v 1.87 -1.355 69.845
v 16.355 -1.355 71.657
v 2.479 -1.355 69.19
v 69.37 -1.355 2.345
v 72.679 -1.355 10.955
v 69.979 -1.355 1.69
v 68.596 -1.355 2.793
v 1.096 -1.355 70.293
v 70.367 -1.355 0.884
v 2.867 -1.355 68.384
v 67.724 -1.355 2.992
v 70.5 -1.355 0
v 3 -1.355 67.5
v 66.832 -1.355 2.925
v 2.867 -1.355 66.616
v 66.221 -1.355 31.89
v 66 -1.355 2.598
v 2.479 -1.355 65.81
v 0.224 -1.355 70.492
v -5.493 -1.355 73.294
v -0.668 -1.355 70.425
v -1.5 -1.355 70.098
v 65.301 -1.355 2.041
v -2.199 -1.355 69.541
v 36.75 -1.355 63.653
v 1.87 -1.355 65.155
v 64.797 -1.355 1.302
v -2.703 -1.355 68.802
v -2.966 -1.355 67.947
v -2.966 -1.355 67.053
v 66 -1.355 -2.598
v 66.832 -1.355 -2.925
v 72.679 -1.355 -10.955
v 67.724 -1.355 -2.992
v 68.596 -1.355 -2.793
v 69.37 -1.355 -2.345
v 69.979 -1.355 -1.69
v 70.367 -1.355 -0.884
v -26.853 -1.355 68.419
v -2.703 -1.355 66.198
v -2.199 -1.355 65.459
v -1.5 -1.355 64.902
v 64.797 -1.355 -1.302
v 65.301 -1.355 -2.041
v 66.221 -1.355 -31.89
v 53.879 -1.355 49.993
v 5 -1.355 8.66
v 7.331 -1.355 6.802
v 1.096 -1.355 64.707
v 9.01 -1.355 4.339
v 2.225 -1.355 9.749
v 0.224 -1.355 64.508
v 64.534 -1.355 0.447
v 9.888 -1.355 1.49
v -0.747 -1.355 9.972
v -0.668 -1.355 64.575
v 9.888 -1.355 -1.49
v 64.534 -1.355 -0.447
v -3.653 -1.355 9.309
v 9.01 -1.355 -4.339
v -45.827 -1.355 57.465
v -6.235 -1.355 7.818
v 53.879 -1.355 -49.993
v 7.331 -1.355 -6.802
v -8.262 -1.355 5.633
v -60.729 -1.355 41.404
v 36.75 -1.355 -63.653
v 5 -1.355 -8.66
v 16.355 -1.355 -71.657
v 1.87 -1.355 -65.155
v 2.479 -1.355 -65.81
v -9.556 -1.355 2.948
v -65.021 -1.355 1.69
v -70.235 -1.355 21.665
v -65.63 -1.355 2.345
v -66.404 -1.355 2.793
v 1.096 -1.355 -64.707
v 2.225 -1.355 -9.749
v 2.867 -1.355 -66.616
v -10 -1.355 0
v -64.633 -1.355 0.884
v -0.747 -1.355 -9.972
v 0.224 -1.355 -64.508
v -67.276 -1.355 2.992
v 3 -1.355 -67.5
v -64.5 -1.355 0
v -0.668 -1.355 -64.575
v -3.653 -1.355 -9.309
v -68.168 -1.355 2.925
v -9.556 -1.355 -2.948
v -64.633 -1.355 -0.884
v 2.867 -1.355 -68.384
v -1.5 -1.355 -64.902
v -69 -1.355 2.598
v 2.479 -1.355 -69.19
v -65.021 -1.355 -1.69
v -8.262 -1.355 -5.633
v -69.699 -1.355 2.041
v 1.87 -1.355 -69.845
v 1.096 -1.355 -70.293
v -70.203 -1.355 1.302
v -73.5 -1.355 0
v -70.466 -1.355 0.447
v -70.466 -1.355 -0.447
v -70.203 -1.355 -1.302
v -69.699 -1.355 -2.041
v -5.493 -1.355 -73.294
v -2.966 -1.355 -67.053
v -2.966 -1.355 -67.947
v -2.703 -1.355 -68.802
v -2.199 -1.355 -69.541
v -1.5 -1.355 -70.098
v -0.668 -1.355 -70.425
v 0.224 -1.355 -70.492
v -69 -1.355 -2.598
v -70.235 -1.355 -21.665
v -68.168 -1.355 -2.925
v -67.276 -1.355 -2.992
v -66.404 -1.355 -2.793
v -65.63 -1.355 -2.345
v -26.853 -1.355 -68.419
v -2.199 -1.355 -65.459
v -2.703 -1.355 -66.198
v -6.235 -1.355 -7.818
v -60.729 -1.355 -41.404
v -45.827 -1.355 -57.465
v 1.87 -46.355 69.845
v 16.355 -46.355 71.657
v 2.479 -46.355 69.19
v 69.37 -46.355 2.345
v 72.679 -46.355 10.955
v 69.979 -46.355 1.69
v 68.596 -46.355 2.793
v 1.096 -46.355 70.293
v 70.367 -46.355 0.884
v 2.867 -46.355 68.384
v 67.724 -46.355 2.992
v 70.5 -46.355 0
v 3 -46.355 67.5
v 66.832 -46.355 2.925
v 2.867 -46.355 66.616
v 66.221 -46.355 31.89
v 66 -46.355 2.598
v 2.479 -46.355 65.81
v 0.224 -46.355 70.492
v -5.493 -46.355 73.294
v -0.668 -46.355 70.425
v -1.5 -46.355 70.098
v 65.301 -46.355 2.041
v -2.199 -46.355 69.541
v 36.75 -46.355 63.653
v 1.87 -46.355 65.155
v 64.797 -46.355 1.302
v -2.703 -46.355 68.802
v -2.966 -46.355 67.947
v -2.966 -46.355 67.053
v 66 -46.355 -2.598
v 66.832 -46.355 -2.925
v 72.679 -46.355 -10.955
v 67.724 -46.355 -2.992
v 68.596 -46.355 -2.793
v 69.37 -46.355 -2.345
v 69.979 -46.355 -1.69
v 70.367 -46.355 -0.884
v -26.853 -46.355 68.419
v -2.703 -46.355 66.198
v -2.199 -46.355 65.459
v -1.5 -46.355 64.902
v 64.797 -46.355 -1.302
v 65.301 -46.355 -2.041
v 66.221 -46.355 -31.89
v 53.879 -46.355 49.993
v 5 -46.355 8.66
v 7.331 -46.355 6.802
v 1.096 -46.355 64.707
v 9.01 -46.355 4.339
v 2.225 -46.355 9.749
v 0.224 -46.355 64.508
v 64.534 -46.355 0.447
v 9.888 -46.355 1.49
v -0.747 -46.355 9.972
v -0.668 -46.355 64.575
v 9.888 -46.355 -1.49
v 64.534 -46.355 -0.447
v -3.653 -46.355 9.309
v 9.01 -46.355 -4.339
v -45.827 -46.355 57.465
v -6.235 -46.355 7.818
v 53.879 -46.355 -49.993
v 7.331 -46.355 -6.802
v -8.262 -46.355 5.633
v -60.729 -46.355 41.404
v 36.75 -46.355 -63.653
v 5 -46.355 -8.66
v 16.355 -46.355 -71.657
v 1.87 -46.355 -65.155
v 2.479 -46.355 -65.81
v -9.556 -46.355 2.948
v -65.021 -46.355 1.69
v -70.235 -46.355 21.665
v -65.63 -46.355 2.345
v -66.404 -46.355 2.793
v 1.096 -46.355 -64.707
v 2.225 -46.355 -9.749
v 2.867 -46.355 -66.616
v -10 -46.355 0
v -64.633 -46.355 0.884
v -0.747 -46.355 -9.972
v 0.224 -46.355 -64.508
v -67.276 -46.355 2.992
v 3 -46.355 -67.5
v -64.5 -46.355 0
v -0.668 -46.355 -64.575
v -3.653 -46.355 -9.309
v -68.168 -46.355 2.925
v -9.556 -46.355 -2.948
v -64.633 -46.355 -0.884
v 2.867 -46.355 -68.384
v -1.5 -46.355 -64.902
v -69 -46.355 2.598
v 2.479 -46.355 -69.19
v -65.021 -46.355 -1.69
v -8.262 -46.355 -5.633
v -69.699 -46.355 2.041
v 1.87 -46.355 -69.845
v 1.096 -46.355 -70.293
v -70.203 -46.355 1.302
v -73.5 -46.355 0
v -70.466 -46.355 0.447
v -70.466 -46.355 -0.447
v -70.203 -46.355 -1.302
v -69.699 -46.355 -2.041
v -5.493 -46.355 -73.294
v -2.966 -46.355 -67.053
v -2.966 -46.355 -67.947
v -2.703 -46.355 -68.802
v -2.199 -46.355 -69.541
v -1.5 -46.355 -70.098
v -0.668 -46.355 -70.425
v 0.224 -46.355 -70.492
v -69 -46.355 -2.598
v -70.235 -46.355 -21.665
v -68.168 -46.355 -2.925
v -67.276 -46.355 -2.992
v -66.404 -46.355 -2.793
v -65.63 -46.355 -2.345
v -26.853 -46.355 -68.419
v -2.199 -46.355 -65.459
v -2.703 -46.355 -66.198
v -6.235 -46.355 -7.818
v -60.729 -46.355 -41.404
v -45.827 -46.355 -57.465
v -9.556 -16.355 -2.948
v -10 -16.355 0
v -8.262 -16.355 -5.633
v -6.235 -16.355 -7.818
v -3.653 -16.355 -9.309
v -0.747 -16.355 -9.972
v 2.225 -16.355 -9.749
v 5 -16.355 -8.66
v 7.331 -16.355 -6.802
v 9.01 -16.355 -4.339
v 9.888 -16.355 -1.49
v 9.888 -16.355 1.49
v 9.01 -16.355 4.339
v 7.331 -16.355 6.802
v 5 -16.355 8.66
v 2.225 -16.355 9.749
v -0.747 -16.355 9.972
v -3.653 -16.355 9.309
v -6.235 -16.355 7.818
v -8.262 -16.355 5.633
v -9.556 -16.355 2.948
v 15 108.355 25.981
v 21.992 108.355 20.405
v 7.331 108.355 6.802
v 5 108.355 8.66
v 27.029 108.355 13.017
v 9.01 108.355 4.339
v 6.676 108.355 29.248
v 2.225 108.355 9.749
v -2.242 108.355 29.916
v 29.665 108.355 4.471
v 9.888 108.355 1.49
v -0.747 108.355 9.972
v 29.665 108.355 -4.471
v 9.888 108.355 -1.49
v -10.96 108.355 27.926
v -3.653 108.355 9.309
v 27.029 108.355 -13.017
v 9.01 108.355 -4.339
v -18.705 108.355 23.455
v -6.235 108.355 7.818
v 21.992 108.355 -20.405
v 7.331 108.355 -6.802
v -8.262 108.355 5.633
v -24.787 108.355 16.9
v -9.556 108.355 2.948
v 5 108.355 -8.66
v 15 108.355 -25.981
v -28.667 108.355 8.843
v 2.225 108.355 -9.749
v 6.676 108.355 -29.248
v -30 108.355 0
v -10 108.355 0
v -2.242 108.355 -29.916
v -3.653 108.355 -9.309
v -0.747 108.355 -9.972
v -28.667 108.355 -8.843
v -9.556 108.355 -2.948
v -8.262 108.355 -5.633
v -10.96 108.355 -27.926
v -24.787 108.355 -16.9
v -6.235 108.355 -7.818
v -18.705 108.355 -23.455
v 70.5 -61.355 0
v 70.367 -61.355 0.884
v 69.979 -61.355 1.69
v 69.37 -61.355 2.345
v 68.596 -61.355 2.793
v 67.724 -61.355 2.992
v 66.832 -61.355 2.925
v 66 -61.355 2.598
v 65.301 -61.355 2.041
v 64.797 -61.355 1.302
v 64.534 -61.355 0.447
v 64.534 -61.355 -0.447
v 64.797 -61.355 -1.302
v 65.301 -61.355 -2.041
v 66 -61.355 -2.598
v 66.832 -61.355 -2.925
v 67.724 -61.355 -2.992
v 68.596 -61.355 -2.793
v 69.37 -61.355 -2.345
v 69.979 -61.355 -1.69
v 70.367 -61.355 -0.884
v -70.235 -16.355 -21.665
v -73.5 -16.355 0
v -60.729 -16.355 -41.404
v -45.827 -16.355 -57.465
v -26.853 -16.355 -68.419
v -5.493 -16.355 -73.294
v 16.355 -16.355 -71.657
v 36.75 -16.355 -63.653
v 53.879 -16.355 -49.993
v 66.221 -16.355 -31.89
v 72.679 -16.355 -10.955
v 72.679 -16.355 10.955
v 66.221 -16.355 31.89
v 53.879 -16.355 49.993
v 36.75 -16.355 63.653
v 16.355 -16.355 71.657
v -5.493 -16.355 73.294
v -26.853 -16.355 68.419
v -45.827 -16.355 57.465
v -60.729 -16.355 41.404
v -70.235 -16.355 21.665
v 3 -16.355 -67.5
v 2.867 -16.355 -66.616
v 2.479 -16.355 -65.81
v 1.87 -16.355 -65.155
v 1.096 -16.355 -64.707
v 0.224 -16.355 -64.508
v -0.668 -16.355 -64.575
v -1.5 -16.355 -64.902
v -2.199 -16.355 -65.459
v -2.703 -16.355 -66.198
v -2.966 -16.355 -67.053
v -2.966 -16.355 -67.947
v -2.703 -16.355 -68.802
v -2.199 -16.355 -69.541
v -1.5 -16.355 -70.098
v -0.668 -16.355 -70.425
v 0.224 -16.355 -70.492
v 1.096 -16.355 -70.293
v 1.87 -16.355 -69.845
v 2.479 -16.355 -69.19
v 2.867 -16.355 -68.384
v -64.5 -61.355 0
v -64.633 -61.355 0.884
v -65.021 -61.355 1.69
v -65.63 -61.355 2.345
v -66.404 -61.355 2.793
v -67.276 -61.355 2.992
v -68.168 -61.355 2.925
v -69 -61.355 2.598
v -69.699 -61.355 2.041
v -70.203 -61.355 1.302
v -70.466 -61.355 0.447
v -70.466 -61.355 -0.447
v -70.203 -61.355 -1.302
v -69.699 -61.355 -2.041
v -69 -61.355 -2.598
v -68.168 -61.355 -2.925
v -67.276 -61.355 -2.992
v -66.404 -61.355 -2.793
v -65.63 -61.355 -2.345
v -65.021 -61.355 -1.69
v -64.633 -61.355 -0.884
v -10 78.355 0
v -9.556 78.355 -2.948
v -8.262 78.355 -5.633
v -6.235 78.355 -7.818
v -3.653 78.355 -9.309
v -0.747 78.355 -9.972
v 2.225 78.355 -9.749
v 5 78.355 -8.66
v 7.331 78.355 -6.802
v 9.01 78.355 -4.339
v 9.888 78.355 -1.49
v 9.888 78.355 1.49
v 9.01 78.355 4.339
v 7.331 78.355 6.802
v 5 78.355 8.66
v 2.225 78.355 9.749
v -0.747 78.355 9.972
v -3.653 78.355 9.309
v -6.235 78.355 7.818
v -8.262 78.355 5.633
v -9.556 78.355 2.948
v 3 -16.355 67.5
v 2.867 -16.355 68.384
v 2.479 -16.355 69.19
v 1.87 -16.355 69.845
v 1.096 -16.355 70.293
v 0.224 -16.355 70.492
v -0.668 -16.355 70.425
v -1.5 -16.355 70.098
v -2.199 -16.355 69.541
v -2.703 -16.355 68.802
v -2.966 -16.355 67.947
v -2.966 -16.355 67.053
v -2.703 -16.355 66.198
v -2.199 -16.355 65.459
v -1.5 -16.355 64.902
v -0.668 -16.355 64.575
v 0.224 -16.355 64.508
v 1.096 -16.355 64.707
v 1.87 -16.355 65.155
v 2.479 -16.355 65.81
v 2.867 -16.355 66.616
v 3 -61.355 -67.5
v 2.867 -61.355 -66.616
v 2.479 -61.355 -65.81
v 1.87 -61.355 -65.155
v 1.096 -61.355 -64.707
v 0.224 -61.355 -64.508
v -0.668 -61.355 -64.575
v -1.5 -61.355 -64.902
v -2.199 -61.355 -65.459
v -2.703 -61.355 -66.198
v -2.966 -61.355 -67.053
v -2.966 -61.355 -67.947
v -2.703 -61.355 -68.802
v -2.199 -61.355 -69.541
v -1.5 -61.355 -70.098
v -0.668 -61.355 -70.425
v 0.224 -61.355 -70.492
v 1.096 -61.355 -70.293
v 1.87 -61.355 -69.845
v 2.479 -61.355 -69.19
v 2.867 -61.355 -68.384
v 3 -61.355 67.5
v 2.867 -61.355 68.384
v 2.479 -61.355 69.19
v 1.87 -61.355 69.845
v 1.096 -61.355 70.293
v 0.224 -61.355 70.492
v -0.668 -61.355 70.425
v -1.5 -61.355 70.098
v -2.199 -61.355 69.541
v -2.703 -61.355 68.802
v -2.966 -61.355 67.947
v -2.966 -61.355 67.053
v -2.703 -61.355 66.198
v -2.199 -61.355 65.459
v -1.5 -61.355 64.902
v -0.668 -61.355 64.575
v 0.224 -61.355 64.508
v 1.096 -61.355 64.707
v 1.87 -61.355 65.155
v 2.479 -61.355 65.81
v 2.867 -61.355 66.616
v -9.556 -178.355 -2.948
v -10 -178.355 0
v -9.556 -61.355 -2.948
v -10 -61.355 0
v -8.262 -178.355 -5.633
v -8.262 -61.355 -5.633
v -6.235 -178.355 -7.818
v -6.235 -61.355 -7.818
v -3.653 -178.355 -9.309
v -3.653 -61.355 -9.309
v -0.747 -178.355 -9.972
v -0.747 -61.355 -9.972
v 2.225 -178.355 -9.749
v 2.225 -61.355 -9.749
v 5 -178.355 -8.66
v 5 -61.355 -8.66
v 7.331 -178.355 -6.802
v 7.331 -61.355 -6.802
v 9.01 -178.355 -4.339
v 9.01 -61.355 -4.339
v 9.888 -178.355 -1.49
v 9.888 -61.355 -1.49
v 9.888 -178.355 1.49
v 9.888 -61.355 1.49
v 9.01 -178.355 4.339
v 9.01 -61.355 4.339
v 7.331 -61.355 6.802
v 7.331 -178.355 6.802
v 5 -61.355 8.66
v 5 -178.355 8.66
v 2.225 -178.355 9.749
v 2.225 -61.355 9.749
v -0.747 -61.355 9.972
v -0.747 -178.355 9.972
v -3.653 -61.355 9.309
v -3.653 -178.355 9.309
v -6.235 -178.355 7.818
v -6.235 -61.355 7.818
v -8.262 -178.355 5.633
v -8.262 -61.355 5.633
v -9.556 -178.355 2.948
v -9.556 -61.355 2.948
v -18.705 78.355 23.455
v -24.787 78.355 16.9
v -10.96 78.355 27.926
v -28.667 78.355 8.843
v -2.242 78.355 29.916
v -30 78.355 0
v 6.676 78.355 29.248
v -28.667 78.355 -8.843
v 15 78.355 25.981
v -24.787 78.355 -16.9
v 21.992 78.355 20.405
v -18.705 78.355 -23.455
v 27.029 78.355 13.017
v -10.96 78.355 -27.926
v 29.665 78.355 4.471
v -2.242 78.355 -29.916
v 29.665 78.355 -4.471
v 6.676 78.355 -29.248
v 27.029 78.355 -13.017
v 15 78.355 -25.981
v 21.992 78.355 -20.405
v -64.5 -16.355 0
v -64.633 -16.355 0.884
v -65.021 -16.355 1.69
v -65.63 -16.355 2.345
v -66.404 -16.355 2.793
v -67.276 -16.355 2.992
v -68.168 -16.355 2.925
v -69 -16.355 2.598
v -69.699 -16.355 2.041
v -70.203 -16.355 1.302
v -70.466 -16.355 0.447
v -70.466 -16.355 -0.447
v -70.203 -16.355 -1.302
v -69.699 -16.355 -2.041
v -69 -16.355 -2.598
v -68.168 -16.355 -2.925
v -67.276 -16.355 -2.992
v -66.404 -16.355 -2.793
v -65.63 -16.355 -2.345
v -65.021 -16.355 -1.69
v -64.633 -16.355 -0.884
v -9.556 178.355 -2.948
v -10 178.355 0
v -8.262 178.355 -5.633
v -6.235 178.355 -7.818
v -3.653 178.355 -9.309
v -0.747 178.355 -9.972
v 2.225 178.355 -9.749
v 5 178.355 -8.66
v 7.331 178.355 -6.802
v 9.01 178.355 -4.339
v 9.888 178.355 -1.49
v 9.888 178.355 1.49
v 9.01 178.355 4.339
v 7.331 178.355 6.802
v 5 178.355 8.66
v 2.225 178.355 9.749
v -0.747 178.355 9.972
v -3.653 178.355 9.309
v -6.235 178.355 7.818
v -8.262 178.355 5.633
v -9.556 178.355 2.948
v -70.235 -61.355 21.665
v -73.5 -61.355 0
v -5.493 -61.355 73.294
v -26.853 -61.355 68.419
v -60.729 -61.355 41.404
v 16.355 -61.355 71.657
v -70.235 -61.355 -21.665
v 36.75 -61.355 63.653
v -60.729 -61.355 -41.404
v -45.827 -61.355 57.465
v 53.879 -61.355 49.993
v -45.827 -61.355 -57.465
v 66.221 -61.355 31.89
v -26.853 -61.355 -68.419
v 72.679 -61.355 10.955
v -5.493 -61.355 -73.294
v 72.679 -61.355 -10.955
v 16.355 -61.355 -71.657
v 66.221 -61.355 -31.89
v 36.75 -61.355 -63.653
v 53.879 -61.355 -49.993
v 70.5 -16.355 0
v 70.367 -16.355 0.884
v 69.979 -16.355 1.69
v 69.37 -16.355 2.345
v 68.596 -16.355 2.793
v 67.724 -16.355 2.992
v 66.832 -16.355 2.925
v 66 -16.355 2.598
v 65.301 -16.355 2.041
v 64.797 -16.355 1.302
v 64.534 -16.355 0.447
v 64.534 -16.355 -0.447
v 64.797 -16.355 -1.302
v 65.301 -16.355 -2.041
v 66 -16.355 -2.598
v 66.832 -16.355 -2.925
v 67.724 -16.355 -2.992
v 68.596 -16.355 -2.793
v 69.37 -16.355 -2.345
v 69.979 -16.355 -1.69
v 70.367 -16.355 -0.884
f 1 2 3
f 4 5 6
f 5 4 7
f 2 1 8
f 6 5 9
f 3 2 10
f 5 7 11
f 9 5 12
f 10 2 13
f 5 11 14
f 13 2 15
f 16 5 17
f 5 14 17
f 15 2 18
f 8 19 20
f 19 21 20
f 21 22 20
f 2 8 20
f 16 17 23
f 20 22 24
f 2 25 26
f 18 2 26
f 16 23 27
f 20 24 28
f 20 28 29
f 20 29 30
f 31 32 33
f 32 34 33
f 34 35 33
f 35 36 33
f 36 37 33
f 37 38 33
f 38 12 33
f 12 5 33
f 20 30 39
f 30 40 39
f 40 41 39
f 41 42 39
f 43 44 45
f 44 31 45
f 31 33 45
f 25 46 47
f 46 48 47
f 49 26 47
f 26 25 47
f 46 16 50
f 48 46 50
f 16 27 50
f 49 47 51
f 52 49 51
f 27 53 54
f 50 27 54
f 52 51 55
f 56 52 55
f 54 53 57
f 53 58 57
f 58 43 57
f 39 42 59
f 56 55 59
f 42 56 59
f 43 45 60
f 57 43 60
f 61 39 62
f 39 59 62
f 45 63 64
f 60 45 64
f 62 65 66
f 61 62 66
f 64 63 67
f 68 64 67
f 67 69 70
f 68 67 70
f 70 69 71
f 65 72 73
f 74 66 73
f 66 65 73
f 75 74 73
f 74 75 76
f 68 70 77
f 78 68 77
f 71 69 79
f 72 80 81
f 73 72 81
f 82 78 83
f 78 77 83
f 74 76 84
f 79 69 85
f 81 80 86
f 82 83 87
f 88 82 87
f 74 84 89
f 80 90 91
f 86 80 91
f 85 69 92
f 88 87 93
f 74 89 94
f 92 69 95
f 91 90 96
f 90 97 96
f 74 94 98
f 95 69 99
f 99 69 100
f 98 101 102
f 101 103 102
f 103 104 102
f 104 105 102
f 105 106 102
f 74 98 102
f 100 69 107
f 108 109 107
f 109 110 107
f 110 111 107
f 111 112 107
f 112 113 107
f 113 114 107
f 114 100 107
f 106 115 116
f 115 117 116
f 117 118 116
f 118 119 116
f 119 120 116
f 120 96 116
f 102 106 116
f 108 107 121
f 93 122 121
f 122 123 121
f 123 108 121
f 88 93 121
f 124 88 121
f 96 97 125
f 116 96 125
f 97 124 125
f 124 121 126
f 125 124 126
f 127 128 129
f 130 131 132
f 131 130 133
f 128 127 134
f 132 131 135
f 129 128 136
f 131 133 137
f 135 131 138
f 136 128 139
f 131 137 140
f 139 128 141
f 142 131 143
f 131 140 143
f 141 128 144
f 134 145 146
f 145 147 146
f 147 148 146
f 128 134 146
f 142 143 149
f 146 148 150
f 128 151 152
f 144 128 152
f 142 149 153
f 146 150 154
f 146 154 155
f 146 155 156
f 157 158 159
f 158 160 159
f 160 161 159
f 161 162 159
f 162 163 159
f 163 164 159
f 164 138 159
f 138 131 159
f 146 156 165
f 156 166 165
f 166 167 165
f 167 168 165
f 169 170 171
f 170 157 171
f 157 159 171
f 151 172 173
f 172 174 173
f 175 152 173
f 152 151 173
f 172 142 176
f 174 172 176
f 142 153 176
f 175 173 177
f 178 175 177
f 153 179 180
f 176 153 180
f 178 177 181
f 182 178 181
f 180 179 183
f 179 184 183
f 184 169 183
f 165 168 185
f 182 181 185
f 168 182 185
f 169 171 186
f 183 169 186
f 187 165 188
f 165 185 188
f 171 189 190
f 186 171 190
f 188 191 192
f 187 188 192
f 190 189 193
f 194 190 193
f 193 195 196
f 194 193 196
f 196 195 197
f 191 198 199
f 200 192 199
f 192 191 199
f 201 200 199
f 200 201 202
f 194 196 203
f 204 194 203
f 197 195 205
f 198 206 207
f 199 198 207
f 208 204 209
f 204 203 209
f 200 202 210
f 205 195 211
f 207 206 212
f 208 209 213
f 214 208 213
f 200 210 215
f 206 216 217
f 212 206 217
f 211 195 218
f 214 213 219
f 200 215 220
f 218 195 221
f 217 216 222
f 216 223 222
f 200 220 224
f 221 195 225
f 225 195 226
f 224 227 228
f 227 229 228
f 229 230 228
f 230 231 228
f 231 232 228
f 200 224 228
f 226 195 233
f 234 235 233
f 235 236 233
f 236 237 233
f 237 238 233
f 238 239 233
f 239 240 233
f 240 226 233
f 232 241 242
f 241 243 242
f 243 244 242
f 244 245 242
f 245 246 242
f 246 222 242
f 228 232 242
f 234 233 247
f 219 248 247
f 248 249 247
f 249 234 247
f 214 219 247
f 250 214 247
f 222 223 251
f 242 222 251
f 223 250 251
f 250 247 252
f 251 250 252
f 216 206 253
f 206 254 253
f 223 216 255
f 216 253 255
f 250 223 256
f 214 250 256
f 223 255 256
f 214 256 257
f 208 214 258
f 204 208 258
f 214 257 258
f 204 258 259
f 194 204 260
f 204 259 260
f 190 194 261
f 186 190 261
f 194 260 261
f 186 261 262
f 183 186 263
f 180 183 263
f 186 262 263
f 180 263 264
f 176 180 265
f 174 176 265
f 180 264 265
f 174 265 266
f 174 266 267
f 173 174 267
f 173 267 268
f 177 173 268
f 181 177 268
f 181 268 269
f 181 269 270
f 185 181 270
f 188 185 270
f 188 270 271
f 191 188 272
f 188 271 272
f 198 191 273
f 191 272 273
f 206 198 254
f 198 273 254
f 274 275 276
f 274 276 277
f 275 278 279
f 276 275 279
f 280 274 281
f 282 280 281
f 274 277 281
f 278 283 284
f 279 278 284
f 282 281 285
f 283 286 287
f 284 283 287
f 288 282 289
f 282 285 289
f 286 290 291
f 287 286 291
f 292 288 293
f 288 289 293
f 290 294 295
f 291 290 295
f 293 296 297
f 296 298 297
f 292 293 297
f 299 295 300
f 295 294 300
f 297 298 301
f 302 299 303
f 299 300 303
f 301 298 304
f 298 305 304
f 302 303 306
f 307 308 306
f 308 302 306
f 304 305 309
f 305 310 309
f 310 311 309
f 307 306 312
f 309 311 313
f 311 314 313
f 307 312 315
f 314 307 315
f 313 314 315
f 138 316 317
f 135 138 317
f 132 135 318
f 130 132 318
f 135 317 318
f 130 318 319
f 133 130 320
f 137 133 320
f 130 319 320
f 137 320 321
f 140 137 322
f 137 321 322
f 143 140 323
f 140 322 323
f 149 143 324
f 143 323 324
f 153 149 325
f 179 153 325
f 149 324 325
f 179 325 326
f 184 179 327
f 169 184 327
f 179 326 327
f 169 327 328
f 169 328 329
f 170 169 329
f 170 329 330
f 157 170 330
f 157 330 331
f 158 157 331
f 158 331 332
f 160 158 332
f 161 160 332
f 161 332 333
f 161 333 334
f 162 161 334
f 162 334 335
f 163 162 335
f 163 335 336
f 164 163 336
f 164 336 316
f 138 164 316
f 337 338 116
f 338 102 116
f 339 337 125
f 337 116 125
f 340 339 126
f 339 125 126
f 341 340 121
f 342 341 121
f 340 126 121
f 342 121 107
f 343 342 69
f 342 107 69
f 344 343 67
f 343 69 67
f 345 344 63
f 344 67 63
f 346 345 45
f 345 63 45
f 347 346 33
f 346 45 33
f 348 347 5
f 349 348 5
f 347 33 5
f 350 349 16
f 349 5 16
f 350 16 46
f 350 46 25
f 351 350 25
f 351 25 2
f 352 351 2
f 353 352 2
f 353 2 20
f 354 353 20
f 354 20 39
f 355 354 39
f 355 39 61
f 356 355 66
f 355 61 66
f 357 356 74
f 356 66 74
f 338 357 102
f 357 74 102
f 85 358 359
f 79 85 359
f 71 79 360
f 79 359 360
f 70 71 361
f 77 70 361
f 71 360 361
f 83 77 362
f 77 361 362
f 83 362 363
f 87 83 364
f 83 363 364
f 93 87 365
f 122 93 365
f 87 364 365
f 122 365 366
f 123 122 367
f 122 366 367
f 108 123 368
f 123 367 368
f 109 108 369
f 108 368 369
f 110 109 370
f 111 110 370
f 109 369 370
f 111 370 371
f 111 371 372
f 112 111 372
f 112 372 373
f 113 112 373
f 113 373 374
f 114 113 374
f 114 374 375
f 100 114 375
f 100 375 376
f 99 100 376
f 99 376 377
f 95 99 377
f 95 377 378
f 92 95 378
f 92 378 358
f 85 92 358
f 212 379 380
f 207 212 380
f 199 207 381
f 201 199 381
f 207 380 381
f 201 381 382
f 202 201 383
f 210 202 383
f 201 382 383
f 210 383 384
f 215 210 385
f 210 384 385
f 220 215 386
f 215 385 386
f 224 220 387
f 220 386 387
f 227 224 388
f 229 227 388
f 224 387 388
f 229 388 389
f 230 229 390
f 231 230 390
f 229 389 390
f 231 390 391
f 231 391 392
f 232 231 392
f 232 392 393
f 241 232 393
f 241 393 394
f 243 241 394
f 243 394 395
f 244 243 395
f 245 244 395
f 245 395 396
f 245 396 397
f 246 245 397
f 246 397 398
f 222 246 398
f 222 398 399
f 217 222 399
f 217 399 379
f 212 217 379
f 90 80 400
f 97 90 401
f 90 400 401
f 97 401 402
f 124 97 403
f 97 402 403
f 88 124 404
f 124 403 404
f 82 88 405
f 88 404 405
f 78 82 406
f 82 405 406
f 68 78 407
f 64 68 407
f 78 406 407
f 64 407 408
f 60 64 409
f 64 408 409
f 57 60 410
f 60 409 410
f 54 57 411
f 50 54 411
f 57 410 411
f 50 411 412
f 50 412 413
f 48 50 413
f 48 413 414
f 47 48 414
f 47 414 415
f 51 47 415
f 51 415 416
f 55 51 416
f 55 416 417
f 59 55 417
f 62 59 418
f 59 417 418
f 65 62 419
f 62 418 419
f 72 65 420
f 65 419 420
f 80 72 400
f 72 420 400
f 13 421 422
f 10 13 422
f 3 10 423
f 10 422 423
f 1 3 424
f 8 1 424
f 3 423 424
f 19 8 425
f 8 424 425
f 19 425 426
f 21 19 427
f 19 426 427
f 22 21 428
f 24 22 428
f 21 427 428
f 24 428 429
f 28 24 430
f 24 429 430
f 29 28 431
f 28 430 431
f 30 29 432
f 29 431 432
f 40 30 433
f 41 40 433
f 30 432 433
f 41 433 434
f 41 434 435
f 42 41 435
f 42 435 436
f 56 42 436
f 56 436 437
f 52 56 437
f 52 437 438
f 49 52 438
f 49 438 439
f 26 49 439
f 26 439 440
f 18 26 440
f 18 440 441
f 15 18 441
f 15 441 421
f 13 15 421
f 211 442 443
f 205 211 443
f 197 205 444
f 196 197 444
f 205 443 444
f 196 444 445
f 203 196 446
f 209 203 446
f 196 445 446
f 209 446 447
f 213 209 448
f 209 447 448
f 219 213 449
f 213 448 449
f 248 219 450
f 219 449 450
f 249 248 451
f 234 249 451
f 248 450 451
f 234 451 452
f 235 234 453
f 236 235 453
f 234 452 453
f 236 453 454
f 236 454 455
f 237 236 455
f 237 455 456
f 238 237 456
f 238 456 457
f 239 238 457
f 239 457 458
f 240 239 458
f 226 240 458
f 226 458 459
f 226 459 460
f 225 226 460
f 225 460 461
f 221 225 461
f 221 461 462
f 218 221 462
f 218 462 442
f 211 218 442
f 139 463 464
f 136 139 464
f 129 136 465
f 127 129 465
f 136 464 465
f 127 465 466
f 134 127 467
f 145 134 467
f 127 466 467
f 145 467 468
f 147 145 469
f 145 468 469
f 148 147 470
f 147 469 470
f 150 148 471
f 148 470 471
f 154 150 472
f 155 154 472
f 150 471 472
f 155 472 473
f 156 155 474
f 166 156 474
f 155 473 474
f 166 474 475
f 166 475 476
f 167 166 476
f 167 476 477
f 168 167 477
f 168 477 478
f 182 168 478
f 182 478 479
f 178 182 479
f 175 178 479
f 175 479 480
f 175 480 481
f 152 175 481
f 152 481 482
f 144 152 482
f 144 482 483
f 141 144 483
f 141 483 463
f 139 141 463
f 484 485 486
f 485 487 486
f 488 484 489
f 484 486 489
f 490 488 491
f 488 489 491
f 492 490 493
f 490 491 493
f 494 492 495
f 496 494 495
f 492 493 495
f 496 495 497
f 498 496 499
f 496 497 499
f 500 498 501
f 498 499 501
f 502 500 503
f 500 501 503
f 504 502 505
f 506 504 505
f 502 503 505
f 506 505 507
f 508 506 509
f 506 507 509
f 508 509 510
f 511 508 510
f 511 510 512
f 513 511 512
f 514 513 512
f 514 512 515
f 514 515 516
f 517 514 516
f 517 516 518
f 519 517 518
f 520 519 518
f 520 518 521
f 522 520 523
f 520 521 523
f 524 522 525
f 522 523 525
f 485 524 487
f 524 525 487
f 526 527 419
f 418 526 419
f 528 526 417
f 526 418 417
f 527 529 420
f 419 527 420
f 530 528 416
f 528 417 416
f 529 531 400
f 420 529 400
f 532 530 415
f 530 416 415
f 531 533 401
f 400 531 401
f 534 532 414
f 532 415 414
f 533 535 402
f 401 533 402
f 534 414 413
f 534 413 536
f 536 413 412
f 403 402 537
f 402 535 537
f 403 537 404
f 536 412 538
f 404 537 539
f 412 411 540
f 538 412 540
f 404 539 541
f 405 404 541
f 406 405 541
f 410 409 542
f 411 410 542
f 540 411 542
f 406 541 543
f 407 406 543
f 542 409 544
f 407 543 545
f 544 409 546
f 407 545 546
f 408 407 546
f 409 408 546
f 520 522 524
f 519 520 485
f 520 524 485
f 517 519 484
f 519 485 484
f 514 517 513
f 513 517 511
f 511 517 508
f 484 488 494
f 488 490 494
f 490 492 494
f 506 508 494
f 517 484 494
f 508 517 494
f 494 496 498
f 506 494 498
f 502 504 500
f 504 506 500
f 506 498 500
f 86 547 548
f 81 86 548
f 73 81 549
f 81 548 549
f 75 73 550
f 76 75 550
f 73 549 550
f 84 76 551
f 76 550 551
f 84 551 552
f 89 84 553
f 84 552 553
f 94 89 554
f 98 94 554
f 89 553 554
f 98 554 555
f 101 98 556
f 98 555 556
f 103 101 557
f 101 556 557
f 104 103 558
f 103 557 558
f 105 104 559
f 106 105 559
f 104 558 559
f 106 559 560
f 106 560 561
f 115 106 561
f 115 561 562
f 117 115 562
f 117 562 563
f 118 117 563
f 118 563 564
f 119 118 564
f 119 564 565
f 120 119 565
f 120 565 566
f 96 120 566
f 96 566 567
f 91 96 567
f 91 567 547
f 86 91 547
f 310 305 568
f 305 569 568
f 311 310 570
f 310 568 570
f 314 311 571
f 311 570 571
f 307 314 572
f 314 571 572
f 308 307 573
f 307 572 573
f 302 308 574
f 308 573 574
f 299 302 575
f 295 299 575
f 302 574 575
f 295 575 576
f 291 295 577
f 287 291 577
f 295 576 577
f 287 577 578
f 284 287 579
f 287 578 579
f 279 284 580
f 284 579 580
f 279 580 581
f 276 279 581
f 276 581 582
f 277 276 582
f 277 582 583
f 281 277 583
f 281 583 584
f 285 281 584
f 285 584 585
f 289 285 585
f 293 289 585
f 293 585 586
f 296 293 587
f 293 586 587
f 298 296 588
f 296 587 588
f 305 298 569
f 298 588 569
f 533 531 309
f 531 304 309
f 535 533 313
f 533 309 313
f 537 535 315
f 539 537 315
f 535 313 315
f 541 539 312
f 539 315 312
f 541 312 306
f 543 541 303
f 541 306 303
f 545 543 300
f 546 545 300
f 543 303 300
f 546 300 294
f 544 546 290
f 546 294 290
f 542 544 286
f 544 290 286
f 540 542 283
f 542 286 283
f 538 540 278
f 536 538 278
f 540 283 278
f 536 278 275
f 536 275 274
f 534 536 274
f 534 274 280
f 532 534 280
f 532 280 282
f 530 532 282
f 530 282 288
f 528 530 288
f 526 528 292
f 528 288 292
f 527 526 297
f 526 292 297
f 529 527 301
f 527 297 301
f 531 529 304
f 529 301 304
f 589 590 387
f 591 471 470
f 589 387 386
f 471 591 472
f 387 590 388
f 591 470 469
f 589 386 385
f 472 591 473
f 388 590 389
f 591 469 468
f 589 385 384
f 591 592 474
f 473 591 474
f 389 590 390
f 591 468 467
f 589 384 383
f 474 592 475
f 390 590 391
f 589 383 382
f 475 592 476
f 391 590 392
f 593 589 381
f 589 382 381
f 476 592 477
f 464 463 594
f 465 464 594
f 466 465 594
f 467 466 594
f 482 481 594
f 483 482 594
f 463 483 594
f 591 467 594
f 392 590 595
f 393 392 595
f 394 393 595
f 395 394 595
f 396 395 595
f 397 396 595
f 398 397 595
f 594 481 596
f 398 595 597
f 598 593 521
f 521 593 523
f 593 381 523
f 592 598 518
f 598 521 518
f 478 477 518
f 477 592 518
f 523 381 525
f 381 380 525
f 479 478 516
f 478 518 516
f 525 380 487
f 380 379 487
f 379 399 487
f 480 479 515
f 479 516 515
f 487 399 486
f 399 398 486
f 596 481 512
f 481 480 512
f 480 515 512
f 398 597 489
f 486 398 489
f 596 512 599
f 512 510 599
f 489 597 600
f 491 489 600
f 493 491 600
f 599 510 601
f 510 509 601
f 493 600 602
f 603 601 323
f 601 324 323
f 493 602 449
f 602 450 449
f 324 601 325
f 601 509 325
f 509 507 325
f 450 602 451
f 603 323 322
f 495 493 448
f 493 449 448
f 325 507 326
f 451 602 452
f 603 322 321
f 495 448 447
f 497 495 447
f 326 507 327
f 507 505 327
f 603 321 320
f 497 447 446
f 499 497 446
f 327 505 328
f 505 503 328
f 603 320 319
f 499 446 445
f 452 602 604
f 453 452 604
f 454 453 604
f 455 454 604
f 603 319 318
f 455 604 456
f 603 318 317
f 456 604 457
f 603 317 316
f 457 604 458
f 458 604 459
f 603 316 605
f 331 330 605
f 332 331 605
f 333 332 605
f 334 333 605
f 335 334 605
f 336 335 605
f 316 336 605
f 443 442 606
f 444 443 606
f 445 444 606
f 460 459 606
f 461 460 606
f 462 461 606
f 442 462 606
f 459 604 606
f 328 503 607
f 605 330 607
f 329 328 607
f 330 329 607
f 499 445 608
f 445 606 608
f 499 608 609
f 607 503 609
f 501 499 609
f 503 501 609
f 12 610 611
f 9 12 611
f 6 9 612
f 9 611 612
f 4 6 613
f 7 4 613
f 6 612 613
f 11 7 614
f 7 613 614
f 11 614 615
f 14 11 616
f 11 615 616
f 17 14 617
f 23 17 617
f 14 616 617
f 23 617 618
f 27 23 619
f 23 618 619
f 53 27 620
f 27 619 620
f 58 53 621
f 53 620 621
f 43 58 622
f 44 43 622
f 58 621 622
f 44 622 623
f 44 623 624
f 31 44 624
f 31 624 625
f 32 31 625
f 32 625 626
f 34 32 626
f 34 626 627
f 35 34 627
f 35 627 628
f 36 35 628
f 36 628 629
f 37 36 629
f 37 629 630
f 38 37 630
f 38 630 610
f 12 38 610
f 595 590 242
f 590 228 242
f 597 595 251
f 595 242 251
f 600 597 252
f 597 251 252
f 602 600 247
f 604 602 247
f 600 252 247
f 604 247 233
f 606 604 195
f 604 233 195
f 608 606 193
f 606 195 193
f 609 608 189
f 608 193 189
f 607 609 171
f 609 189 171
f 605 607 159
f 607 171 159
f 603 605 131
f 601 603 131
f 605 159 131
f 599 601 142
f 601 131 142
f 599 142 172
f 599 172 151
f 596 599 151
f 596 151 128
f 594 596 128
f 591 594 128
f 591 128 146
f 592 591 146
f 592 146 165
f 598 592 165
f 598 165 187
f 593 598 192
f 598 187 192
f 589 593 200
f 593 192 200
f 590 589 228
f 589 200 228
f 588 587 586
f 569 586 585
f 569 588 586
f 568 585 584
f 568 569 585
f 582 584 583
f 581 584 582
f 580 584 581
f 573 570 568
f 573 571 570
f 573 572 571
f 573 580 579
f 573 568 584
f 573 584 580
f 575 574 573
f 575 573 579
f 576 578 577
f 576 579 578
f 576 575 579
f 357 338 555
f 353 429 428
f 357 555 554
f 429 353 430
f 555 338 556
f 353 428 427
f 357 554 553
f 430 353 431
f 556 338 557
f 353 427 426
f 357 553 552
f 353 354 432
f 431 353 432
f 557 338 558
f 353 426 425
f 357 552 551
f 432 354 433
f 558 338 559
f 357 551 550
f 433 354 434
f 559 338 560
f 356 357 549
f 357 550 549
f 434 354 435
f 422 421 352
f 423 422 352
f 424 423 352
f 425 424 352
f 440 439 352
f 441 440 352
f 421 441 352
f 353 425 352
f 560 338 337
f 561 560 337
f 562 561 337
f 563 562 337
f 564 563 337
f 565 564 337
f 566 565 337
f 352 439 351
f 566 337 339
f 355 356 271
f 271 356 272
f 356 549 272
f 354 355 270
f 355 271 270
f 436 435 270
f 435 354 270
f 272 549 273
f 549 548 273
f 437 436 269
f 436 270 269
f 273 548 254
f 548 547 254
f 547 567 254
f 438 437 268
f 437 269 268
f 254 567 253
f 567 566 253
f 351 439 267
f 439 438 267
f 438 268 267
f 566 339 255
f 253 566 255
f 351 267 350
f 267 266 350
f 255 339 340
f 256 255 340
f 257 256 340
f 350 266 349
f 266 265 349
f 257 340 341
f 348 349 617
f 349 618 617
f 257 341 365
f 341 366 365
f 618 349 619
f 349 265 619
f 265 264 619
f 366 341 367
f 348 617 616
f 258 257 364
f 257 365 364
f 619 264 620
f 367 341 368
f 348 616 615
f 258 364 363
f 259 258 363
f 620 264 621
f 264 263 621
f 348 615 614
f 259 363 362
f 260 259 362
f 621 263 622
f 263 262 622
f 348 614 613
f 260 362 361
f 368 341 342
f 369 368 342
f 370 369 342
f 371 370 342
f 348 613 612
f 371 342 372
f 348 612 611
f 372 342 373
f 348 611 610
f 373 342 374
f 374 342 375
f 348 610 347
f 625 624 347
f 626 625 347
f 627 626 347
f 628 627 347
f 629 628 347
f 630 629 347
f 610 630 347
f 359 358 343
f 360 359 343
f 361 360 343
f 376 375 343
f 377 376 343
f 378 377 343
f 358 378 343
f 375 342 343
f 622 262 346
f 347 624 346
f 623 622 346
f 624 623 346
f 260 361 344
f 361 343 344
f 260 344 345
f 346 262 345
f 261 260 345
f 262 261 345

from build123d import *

# Parameters (mm, degrees)
SKETCH1_W          = 10
SKETCH1_H          = 30
SKETCH1_W_2        = 20
SKETCH1_H_2        = 70
SKETCH2_R          = 3
CUT_EXTRUDE1_DEPTH = 80


with BuildPart() as part:
    # Sketch1 → Revolve3 (revolve)
    with BuildSketch(Plane.XY, mode=Mode.PRIVATE) as revolve3_sk:
        Polygon((0, 78.35475), (0, -178.35475), (10, -178.35475), (10, -61.35475), (73.5, -61.35475), (73.5, -46.35475), (10, -46.35475), (10, -16.35475), (73.5, -16.35475), (73.5, -1.35475), (10, -1.35475), (10, 78.35475), align=None)
        with Locations((5, 93.35475)):
            Rectangle(SKETCH1_W, SKETCH1_H)
        with Locations((20, 93.35475)):
            Rectangle(SKETCH1_W_2, SKETCH1_H)
        with Locations((5, 143.35475)):
            Rectangle(SKETCH1_W, SKETCH1_H_2)
    revolve(revolve3_sk.sketch.rotate(Axis((0, 223.956756344, 0), (0, -1, 0)), 180), axis=Axis((0, 223.956756344, 0), (0, -1, 0)))

    # Sketch2 → Cut-Extrude1 (cut)
    with BuildSketch(Plane.XZ.offset(61.35475)):
        with Locations((67.5, 0)):
            Circle(SKETCH2_R)
        with Locations((-67.5, 0)):
            Circle(SKETCH2_R)
        with Locations((0, 67.5)):
            Circle(SKETCH2_R)
        with Locations((0, -67.5)):
            Circle(SKETCH2_R)
    extrude(amount=-CUT_EXTRUDE1_DEPTH, mode=Mode.SUBTRACT)


solid = part.part
